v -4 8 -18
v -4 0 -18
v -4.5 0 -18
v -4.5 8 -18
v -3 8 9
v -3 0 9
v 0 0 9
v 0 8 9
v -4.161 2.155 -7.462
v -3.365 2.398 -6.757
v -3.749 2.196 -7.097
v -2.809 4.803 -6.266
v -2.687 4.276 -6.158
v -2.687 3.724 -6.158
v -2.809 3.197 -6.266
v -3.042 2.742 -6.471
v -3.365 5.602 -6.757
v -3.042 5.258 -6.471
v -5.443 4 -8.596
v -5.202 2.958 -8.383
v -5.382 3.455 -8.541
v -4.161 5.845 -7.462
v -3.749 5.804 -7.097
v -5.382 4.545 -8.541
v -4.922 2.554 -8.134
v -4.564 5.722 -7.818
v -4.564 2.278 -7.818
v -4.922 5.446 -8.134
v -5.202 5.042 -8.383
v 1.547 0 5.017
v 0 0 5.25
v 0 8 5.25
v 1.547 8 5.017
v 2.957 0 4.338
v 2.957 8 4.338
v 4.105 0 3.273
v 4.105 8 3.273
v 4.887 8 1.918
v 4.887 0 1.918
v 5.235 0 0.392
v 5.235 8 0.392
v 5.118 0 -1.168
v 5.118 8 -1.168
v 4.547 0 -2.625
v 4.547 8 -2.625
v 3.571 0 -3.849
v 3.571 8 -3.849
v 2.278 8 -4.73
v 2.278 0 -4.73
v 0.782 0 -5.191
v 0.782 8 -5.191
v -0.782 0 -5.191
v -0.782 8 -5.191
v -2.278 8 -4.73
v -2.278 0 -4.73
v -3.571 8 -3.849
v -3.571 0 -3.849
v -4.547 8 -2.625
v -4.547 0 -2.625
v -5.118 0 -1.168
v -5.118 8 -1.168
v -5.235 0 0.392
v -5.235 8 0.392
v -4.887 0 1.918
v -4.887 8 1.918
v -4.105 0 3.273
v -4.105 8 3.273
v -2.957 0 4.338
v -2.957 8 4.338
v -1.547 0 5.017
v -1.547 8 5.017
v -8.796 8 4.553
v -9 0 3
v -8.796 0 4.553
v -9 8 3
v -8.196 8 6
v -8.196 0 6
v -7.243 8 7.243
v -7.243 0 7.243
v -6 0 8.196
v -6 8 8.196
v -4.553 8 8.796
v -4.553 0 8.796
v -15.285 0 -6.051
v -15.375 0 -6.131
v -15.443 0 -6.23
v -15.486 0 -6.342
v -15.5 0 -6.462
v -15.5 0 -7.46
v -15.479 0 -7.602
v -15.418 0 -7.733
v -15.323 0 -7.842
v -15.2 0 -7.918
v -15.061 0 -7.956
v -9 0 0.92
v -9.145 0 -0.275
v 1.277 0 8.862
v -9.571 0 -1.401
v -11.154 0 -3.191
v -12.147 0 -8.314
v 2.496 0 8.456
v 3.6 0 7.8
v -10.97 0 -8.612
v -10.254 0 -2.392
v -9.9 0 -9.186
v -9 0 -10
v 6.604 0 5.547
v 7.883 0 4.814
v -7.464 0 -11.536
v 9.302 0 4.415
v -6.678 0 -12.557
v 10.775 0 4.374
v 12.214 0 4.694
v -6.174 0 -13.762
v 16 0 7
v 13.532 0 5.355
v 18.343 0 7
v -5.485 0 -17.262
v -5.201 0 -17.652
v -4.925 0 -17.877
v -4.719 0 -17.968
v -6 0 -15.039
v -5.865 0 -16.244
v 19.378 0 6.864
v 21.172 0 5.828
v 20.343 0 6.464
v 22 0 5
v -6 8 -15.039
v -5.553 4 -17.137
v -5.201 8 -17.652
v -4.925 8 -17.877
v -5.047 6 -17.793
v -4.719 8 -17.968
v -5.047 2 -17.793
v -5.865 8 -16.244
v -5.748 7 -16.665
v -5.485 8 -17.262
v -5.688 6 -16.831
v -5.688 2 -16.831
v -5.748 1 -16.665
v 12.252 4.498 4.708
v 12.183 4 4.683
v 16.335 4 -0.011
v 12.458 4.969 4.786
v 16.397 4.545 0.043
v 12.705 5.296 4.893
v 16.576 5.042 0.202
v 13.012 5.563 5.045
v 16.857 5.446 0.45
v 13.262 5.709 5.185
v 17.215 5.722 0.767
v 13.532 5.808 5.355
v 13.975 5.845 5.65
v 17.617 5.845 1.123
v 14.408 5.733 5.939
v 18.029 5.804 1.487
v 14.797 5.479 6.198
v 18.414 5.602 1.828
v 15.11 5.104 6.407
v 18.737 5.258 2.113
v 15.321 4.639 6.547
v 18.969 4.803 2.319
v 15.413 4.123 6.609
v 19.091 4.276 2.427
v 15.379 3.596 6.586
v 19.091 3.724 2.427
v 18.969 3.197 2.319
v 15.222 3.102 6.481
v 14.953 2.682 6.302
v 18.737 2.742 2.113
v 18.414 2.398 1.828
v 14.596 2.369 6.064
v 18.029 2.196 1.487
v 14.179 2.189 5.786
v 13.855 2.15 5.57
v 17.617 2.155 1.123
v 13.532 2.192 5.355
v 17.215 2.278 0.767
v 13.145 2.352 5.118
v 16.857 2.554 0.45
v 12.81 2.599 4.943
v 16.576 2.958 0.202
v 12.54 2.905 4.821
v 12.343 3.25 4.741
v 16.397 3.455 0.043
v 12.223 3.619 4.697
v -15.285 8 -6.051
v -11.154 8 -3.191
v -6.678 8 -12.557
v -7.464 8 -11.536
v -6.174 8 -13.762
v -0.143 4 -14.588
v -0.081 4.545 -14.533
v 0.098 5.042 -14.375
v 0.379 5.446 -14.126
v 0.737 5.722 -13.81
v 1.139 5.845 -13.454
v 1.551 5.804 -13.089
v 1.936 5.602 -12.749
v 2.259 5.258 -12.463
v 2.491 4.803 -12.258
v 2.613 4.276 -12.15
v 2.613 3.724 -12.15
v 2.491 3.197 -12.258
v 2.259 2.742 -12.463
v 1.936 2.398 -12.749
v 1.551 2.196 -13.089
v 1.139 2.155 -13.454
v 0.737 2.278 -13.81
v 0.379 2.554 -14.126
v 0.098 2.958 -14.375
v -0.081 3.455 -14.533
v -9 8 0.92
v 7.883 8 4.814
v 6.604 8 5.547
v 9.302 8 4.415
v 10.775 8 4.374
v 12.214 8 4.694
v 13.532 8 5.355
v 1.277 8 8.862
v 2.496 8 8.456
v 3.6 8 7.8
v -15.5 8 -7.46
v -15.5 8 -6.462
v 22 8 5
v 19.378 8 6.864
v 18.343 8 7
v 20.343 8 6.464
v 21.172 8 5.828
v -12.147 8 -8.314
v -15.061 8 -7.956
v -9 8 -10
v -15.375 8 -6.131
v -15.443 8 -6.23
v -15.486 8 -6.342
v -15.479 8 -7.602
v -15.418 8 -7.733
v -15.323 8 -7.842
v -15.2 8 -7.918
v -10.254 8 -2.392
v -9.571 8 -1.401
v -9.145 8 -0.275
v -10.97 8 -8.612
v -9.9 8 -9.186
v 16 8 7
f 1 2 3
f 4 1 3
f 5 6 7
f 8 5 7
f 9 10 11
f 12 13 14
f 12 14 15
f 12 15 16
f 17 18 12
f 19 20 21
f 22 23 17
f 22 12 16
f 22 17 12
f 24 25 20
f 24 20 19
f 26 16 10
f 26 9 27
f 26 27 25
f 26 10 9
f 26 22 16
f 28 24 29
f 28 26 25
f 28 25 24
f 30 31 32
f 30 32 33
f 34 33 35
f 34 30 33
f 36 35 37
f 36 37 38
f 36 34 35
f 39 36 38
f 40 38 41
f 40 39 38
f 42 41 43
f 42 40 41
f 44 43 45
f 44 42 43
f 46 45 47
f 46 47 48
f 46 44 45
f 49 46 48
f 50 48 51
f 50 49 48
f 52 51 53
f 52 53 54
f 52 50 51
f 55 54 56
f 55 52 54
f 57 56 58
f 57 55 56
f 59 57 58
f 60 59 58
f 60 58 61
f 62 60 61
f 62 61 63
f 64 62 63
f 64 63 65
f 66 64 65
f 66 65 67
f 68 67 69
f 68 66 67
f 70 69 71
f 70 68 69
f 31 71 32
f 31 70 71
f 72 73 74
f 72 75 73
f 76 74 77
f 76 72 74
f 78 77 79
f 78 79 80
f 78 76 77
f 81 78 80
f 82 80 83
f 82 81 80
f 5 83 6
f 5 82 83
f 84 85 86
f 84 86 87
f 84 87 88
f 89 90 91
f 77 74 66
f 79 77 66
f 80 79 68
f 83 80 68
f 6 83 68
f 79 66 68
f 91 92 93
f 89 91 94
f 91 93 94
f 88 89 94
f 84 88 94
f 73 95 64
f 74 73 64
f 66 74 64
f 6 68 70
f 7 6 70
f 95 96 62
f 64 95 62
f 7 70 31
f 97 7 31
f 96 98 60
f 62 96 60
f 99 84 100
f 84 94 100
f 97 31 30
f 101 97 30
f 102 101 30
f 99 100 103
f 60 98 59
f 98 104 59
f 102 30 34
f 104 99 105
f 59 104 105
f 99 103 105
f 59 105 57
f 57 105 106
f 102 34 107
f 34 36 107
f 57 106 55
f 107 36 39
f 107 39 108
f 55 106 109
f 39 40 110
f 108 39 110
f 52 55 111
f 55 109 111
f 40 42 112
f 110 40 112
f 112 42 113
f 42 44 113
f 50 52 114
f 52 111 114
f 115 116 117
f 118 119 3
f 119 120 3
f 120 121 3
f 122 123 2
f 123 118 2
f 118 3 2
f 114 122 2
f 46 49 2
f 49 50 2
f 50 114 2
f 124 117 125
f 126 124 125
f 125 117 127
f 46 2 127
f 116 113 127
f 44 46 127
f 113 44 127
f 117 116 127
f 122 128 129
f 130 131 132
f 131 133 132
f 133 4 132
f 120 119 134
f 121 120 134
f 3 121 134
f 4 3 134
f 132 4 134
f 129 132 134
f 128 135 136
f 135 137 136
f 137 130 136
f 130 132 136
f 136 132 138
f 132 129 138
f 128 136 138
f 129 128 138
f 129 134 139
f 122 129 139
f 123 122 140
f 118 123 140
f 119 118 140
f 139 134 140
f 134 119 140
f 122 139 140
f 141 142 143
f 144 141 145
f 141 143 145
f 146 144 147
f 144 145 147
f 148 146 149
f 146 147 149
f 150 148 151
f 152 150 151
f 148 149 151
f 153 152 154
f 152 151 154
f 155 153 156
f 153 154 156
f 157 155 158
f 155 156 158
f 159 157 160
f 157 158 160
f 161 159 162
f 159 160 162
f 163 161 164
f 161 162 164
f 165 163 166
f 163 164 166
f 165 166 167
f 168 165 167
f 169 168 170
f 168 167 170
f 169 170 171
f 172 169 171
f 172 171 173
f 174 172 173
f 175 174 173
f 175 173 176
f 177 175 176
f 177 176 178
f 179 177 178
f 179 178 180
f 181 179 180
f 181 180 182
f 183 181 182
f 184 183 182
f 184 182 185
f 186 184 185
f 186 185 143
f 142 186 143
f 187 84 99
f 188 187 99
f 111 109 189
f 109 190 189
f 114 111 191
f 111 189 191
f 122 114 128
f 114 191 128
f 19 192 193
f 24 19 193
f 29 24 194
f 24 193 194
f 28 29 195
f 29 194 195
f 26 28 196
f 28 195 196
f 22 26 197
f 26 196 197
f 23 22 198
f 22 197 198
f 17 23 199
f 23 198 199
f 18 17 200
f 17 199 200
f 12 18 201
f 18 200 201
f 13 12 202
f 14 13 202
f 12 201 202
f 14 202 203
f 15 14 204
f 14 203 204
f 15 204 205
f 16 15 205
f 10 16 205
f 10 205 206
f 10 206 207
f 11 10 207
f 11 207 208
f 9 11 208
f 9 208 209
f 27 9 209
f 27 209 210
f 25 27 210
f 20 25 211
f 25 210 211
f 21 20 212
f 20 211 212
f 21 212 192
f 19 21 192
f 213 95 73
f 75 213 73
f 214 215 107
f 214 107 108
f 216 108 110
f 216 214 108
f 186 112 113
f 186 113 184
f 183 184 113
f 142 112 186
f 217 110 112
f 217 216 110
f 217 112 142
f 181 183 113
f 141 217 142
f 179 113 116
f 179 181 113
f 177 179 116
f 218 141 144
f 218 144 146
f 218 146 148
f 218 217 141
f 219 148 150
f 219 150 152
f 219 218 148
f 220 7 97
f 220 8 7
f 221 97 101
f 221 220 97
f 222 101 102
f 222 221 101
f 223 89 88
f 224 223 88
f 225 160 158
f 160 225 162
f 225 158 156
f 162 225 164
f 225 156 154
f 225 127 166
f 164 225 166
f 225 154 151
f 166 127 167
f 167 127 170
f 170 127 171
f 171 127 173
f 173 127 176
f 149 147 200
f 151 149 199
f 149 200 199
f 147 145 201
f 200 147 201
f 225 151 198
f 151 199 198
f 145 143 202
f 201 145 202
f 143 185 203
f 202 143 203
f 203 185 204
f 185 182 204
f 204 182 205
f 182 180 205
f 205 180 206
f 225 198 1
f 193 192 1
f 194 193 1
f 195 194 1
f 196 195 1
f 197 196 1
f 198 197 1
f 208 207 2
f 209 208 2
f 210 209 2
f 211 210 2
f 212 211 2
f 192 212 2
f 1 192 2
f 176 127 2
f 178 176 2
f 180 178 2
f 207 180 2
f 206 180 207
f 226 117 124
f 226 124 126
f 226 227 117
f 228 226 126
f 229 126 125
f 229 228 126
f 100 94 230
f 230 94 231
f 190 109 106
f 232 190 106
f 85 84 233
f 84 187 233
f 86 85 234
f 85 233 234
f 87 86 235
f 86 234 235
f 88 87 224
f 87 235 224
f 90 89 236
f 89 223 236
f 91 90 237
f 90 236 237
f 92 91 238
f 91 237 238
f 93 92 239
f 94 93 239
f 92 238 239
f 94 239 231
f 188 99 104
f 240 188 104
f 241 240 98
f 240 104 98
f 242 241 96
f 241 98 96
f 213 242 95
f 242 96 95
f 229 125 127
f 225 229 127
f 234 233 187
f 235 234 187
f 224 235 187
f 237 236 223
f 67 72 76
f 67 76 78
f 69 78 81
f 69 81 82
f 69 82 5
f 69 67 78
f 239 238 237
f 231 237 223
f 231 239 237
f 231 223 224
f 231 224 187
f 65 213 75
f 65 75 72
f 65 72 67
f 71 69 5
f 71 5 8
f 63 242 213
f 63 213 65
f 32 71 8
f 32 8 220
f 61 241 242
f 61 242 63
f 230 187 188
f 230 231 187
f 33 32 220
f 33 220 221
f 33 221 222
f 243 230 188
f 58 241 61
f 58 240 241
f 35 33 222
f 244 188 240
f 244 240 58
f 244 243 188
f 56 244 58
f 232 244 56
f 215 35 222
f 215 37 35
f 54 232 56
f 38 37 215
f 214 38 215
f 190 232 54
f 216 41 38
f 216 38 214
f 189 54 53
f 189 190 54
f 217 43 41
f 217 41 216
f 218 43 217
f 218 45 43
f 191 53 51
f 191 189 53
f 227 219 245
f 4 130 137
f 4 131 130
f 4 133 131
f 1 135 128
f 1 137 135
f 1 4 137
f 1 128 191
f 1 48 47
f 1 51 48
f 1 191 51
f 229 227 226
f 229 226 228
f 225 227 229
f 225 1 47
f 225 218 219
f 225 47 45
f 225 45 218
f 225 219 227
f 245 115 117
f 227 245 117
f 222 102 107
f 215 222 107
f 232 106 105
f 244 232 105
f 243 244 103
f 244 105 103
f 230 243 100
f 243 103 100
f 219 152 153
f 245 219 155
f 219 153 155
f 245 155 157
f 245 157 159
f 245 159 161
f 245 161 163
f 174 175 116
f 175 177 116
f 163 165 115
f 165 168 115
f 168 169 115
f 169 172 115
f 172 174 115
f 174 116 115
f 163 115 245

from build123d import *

# Parameters (mm, degrees)
SKETCH1_R           = 5.25
BOSS_EXTRUDE1_DEPTH = 8
FILLET1_SIZE        = 1.5
FILLET1_SIZE_2      = 3
FILLET2_R           = 5
CHAMFER1_SIZE2      = 0.798099646
CHAMFER1_SIZE       = 6.5
FILLET4_DEPTH       = 8
FILLET5_R           = 0.5
FILLET6_R           = 6
SKETCH2_R           = 1.85
CUT_EXTRUDE1_DEPTH  = 8
FILLET7_R           = 4


with BuildPart() as part:
    # Sketch1 → Boss-Extrude1 (new body)
    with BuildSketch(Plane(origin=(0, 0, 0), x_dir=(1, 0, 0), z_dir=(0, 1, 0))):
        Polygon((20, -7), (22, -5), (-4, 18), (-6, 18), (-6, 13), (-9, 10), (-9, 8.7), (-15.5, 8.7), (-15.5, 6.2), (-9, 1.7), (-9, -9), (2, -9), (10, -3), (16, -7), align=None)
        with Locations(Location((0, 0, 0), (0, 0, 270))):
            Circle(SKETCH1_R, mode=Mode.SUBTRACT)
    extrude(amount=BOSS_EXTRUDE1_DEPTH)

    # Fillet1
    # a fillet whose section is not a circle: 3, 1.5 mm, written as the material it takes off along each edge
    with BuildSketch(Plane(origin=(-6, -7.5, -18), x_dir=(1, 0, 0), z_dir=(0, 1, 0))) as fillet1_piece_1:
        with BuildLine():
            Bezier((FILLET1_SIZE, 0), (0, 0), (0, -FILLET1_SIZE_2), weights=[1, 0.707106781, 1])
            Line((0, -FILLET1_SIZE_2), (0, 0))
            Line((0, 0), (FILLET1_SIZE, 0))
        make_face()
    extrude(amount=23, mode=Mode.SUBTRACT)

    # Fillet2
    fillet2_edges = [part.edges().sort_by_distance(p)[0] for p in [
        (-6, 4, -13),
    ]]
    fillet(fillet2_edges, radius=FILLET2_R)

    # Chamfer1
    chamfer1_edges = [part.edges().sort_by_distance(p)[0] for p in [
        (-15.5, 4, -8.7),
    ]]
    chamfer1_side = [part.faces().sort_by_distance(p)[0] for p in [
        (-15.484038007, 4, -8.7),
    ]]
    chamfer(chamfer1_edges, length=CHAMFER1_SIZE - 0.0001, length2=CHAMFER1_SIZE2 - 0.0001, reference=chamfer1_side[0])  # a hair under: the kernel refuses the full size

    # Fillet4: read off the stored shape, not the designer's step
    # Fillet4 outline → Fillet4 (add)
    with BuildSketch(Plane(origin=(0, 0, 0), x_dir=(1, 0, 0), z_dir=(0, 1, 0))):
        with BuildLine():
            ThreePointArc((-11.153950106, 3.191196227), (-9.57110344, 1.40076867), (-9, -0.919764731))
            Line((-9, -0.919764731), (-9, 1.7))
            Line((-9, 1.7), (-11.153950106, 3.191196227))
        make_face()
        with BuildLine():
            Line((-9, 8.7), (-9, 10))
            ThreePointArc((-9, 10), (-10.428118078, 8.860869286), (-12.170105392, 8.310760001))
            Line((-12.170105392, 8.310760001), (-9, 8.7))
        make_face()
    extrude(amount=FILLET4_DEPTH)

    # Fillet5
    fillet5_edges = [part.edges().sort_by_distance(p)[0] for p in [
        (-15.5, 4, -6.2),
        (-15.5, 4, -7.902000354),
    ]]
    fillet(fillet5_edges, radius=FILLET5_R)

    # Fillet6
    fillet6_edges = [part.edges().sort_by_distance(p)[0] for p in [
        (10, 4, 3),
        (2, 4, 9),
        (-9, 4, 9),
    ]]
    fillet(fillet6_edges, radius=FILLET6_R)

    # Sketch2 → Cut-Extrude1 (cut)
    with BuildSketch(Plane(origin=(7.176763485, 0, -8.112863071), x_dir=(-0.7489965624903806, 0, -0.662573882203029), z_dir=(0.662573882203029, 0, -0.7489965624903806))):
        with Locations((7.92231613, 4)):
            Circle(SKETCH2_R)
        with Locations((-14.07768387, 4)):
            Circle(SKETCH2_R)
    extrude(amount=-CUT_EXTRUDE1_DEPTH, mode=Mode.SUBTRACT)

    # Fillet7
    fillet7_edges = [part.edges().sort_by_distance(p)[0] for p in [
        (20, 4, 7),
    ]]
    fillet(fillet7_edges, radius=FILLET7_R)


solid = part.part
